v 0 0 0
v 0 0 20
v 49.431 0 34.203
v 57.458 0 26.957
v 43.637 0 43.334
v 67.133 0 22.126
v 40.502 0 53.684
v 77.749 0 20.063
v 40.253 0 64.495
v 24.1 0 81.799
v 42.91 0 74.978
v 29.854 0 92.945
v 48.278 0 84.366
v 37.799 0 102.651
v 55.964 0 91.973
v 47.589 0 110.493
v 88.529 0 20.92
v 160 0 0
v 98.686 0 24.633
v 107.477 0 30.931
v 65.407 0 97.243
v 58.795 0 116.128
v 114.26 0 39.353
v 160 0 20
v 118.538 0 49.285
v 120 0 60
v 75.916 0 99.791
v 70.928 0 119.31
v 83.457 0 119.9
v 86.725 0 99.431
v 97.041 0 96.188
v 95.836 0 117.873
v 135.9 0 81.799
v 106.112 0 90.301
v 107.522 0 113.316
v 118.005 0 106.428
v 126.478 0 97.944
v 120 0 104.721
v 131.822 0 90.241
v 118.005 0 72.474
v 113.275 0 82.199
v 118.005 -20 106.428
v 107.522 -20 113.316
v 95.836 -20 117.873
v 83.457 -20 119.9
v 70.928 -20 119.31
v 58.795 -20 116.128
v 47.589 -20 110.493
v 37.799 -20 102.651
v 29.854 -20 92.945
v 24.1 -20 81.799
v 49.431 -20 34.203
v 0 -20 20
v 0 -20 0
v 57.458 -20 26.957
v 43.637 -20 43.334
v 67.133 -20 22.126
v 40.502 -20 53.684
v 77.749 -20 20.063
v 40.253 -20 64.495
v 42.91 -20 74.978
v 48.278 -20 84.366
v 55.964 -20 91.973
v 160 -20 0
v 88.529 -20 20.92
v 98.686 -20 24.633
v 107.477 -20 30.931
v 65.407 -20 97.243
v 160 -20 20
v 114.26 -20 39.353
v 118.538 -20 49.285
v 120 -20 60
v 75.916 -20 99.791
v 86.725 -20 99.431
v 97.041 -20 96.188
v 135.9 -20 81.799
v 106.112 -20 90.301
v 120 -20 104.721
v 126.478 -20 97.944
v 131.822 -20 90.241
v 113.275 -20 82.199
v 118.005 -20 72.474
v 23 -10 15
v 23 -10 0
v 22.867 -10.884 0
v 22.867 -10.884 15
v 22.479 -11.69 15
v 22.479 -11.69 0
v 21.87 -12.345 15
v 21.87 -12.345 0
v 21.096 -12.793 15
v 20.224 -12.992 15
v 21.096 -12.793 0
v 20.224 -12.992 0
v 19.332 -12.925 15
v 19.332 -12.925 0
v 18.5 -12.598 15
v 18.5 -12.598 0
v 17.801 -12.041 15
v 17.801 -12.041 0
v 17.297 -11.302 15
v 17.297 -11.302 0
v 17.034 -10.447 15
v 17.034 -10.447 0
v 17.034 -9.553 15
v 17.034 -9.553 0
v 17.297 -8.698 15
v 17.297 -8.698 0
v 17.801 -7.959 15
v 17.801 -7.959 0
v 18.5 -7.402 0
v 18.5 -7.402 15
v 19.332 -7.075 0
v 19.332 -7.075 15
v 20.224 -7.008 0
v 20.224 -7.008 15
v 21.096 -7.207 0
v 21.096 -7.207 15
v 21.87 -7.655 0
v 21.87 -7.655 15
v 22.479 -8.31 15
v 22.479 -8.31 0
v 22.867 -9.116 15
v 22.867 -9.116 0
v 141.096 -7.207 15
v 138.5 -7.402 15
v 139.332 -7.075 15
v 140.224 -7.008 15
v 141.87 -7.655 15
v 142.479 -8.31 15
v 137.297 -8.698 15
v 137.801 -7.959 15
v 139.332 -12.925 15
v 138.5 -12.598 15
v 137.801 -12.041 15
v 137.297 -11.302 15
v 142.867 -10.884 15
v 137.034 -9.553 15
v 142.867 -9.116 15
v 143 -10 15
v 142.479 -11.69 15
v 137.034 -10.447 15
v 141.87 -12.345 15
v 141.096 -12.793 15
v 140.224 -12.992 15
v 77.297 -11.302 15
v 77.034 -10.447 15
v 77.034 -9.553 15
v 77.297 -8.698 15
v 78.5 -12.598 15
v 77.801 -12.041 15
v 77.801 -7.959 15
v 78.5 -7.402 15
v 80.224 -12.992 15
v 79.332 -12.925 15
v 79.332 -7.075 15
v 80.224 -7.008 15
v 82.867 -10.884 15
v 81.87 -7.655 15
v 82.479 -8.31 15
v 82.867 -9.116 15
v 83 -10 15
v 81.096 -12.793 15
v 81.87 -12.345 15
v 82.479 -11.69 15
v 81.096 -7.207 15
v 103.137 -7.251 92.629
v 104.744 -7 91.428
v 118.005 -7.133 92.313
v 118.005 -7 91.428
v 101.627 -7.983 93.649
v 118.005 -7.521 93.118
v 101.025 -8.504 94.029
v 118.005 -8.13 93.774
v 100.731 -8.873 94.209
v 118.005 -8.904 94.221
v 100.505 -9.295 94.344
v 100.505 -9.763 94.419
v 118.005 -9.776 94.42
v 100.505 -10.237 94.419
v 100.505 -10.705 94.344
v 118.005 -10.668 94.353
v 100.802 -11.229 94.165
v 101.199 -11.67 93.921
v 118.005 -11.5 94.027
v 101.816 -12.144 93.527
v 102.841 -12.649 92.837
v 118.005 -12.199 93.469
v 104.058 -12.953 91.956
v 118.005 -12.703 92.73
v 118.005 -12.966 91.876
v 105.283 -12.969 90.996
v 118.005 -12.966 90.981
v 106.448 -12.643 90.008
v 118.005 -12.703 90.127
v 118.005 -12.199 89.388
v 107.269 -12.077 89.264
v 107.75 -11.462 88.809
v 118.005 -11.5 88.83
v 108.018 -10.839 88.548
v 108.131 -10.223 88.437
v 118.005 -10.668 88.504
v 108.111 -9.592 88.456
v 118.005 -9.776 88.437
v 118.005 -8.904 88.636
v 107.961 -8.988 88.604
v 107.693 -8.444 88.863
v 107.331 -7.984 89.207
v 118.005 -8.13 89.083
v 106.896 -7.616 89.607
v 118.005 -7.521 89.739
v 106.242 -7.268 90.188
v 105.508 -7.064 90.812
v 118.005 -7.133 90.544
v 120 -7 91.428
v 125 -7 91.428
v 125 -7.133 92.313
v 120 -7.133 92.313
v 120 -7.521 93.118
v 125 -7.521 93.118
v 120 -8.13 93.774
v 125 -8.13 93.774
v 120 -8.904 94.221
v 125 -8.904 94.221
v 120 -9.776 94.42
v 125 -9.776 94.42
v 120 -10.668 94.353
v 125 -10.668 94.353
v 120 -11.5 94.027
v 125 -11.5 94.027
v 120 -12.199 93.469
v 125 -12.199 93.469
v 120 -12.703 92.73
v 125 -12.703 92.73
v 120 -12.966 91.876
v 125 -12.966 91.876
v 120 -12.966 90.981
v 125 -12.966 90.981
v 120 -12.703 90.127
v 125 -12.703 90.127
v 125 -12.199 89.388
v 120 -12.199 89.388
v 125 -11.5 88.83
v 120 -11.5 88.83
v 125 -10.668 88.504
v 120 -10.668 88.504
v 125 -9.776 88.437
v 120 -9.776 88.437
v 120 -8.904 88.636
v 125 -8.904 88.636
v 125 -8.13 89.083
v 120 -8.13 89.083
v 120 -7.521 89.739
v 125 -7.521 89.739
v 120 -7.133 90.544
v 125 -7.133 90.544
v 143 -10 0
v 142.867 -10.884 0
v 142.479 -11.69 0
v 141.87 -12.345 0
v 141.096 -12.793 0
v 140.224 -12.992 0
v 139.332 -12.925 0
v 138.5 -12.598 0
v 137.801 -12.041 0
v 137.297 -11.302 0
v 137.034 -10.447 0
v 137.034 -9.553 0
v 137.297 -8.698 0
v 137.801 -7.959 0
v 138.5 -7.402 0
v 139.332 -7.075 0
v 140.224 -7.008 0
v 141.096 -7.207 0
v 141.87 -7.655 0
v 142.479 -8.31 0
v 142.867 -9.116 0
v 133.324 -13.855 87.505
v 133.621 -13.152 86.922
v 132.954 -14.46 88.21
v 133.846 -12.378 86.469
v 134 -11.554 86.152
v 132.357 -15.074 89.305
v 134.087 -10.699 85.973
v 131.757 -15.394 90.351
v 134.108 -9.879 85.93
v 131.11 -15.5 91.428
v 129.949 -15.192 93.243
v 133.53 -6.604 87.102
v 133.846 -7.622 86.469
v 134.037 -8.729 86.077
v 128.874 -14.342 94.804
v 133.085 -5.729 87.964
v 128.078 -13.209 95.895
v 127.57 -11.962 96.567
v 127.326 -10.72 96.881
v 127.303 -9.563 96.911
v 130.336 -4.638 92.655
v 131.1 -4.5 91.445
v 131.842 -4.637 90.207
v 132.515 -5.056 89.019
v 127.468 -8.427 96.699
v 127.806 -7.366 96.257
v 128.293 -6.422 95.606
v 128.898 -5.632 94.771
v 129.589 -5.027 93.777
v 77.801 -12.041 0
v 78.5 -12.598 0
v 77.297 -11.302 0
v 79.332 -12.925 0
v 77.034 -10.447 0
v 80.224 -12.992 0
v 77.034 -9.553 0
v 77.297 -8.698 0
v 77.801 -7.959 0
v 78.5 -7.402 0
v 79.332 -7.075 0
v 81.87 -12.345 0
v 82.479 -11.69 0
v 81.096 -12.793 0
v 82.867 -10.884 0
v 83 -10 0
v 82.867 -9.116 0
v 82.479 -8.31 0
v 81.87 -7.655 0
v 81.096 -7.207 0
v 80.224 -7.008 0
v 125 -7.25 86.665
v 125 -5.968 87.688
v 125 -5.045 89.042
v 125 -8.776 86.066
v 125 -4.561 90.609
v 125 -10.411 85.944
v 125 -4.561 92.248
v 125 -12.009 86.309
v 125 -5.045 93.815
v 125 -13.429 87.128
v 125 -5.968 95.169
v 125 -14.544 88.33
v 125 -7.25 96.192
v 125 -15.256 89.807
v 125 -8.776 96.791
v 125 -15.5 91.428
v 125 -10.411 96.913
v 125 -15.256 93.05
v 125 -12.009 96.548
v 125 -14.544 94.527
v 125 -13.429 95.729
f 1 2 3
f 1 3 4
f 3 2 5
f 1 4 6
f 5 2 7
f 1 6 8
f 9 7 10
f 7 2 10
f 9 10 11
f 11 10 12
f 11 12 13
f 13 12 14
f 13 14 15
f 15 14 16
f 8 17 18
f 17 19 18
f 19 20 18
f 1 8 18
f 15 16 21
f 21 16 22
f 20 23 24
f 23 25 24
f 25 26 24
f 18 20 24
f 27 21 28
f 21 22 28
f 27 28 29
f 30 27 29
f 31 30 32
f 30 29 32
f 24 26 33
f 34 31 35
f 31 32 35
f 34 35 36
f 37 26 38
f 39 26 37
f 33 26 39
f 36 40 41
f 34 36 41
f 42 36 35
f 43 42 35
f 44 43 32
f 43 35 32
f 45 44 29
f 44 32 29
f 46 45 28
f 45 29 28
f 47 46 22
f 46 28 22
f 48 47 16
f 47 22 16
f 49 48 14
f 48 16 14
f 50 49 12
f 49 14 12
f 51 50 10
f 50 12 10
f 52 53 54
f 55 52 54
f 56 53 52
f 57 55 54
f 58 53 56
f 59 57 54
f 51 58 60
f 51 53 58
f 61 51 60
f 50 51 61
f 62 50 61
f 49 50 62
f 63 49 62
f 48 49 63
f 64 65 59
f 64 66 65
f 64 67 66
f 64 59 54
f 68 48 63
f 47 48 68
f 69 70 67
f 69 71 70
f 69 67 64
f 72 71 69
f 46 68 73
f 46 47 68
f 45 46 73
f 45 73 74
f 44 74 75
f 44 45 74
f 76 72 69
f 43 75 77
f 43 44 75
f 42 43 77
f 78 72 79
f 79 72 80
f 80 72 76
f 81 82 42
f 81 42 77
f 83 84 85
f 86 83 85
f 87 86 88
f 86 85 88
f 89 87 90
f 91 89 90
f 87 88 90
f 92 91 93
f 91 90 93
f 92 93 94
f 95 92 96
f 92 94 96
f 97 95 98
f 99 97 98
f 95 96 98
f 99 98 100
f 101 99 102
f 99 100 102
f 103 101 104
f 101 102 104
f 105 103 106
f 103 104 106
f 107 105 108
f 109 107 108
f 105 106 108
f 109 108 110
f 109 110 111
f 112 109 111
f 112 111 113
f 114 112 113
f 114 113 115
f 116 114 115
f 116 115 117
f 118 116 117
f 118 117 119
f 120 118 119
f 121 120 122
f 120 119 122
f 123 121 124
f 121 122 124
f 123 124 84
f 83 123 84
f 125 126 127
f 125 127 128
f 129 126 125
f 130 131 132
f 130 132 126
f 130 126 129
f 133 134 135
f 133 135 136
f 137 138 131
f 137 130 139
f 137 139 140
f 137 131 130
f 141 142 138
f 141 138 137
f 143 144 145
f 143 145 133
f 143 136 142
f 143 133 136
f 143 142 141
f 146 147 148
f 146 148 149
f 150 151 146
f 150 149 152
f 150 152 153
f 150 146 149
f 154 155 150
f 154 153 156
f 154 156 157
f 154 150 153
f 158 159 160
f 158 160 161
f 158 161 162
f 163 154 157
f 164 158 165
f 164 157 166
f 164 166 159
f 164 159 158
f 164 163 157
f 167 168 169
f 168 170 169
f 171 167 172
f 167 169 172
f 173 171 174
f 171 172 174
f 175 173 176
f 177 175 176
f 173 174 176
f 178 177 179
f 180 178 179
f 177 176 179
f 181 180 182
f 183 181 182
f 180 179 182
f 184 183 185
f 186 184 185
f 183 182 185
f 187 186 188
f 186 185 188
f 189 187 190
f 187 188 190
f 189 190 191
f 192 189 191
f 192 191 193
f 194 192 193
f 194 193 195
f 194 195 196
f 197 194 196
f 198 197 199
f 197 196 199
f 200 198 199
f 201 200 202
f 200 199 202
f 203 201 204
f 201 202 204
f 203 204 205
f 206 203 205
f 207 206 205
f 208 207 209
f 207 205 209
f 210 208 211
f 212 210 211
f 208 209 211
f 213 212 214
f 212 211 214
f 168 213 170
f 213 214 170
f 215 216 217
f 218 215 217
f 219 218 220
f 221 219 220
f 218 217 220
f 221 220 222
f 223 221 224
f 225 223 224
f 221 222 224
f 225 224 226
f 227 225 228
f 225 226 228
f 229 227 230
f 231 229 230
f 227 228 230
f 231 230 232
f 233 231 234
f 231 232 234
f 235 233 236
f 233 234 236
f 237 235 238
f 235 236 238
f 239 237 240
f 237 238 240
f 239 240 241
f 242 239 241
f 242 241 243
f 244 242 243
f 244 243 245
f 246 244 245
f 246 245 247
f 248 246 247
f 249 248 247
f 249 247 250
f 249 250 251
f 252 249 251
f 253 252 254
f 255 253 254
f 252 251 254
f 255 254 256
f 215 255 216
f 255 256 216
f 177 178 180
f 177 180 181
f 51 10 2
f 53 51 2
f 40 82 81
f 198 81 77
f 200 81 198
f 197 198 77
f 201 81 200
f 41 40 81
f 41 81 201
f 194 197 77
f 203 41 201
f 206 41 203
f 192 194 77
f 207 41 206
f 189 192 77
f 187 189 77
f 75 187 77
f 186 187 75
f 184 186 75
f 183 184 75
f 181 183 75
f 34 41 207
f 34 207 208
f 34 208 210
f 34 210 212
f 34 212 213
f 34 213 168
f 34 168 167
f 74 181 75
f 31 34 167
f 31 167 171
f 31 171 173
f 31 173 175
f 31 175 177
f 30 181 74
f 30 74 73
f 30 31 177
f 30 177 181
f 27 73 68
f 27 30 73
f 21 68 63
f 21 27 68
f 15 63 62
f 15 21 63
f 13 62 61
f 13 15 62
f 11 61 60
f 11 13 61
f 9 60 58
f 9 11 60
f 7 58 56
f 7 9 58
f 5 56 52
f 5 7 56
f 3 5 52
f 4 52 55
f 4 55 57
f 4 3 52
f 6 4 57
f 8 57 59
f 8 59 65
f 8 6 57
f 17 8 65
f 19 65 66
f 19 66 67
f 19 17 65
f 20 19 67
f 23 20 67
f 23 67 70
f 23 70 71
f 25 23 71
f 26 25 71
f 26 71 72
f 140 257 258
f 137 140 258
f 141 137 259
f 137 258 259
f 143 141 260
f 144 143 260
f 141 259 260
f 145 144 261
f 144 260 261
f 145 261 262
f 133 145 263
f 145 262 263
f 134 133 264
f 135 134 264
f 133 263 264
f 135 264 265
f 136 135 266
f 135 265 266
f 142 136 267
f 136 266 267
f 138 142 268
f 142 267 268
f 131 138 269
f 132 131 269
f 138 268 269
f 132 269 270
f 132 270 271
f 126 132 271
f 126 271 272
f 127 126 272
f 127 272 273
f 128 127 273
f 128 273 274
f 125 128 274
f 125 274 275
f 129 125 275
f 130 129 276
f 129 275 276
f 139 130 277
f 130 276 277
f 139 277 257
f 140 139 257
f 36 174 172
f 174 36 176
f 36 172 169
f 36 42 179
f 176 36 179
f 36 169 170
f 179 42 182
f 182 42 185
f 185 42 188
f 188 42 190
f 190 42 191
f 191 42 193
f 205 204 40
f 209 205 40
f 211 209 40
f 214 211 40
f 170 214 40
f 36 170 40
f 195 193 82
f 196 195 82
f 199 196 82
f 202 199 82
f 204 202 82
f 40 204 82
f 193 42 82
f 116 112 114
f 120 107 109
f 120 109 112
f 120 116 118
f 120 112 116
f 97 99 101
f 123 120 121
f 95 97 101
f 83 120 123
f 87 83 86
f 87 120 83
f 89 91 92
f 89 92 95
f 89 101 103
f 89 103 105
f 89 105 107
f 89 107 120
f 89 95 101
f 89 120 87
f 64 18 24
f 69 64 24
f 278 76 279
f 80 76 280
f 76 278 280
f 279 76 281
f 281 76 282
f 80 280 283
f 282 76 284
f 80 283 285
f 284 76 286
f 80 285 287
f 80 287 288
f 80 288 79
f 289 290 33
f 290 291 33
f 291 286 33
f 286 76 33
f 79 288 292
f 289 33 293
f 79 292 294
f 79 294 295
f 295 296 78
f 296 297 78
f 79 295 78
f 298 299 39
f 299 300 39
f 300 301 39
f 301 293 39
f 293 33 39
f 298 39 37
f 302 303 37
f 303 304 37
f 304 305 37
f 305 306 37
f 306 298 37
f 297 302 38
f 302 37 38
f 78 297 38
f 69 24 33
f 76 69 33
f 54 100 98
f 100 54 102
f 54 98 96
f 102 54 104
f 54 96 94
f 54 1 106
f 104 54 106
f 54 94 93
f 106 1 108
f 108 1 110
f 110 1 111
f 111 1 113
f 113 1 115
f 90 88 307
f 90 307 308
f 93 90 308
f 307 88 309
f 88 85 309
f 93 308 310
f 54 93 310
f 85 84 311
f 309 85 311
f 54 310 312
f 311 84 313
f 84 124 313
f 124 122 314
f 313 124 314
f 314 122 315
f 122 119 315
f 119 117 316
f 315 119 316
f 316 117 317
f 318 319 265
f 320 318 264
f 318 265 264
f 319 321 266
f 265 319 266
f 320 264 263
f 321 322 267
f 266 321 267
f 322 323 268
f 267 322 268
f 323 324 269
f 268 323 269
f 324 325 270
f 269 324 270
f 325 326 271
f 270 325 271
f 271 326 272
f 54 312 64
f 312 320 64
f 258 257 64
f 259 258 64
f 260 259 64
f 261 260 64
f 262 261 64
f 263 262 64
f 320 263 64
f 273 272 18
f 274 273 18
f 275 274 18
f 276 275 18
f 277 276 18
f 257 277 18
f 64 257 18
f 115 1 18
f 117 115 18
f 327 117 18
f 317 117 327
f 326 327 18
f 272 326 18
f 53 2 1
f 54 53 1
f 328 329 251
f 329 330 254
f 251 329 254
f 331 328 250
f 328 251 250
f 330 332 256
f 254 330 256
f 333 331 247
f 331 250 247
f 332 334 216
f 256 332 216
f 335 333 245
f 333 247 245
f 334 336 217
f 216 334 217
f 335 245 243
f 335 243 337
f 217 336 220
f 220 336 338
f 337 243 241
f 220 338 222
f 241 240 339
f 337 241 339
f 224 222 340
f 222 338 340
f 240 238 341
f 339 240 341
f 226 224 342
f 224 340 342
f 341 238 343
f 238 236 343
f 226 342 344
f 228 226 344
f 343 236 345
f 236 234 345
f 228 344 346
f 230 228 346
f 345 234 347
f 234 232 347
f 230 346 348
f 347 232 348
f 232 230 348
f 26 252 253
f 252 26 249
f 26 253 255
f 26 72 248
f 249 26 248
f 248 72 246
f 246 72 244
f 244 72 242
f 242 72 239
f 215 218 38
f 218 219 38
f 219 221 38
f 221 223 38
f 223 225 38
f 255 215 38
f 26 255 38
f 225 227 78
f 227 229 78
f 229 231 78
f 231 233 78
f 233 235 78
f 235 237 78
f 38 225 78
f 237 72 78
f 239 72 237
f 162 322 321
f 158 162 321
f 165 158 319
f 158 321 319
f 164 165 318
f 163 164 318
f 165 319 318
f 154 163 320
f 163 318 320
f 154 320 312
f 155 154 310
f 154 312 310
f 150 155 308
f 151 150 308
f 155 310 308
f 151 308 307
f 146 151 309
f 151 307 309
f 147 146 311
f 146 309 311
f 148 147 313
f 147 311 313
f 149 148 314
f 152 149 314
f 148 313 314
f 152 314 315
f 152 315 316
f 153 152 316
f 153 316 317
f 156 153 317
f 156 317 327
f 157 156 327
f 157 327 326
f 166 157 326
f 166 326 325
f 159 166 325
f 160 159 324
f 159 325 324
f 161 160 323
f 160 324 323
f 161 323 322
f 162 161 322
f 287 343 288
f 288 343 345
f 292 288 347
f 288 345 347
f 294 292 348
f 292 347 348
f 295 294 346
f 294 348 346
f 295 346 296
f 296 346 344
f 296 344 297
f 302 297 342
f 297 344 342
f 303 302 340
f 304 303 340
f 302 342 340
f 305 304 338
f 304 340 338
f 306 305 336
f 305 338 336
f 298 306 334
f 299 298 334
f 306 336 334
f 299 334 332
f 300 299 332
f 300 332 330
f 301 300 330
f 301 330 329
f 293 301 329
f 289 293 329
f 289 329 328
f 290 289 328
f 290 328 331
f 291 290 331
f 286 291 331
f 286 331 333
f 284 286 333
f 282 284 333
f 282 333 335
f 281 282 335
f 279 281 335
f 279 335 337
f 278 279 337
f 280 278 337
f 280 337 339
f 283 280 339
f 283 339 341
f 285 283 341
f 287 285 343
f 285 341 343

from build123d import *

# Parameters (mm, degrees)
F0_R      = 40
F1_DEPTH  = 20
F3_DEPTH  = 25
F4_R      = 3
F5_DEPTH  = 17.5
F7_R      = 5.5
F8_DEPTH  = 25
F9_R      = 3
F10_DEPTH = 15


with BuildPart() as f1:
    # F0 (on Front) → F1 (new body)
    with BuildSketch(Plane.XZ):
        with BuildLine():
            Line((0, 20), (0, 0))
            Line((0, 0), (160, 0))
            Line((160, 0), (160, 20))
            Line((160, 20), (135.8997487421, 81.7994974843))
            ThreePointArc((135.8997487421, 81.7994974843), (80, 120), (24.1002512579, 81.7994974843))
            Line((24.1002512579, 81.7994974843), (0, 20))
        make_face()
        with Locations((80, 60)):
            Circle(F0_R, mode=Mode.SUBTRACT)
    extrude(amount=F1_DEPTH)

    # F2 (on face) → F3 (cut)
    with BuildSketch(Plane.XZ.offset(20)):
        Polygon((118.0051983823, 117.4108353592), (118.0051983823, 60), (120, 60), (120, 117.2667294741), align=None)
    extrude(amount=-F3_DEPTH, mode=Mode.SUBTRACT)

    # F4 (on face) → F5 (cut, symmetric)
    with BuildSketch(Plane.YZ.offset(118.0051983823)):
        with Locations((-10, 91.4284922857)):
            Circle(F4_R)
    extrude(amount=F5_DEPTH, both=True, mode=Mode.SUBTRACT)

    # F7 (on offset) → F8 (cut)
    with BuildSketch(Plane(origin=(125, 0, 0), x_dir=(0, -1, 0), z_dir=(-1, 0, 0))):
        with Locations((10, 91.4284922857)):
            Circle(F7_R)
    extrude(amount=-F8_DEPTH, mode=Mode.SUBTRACT)

    # F9 (on face) → F10 (cut)
    with BuildSketch(Plane(origin=(0, 0, 0), x_dir=(1, 0, 0), z_dir=(0, 0, -1))):
        with Locations((20, 10)):
            Circle(F9_R)
        with Locations((140, 10)):
            Circle(F9_R)
        with Locations((80, 10)):
            Circle(F9_R)
    extrude(amount=-F10_DEPTH, mode=Mode.SUBTRACT)


solid = f1.part
